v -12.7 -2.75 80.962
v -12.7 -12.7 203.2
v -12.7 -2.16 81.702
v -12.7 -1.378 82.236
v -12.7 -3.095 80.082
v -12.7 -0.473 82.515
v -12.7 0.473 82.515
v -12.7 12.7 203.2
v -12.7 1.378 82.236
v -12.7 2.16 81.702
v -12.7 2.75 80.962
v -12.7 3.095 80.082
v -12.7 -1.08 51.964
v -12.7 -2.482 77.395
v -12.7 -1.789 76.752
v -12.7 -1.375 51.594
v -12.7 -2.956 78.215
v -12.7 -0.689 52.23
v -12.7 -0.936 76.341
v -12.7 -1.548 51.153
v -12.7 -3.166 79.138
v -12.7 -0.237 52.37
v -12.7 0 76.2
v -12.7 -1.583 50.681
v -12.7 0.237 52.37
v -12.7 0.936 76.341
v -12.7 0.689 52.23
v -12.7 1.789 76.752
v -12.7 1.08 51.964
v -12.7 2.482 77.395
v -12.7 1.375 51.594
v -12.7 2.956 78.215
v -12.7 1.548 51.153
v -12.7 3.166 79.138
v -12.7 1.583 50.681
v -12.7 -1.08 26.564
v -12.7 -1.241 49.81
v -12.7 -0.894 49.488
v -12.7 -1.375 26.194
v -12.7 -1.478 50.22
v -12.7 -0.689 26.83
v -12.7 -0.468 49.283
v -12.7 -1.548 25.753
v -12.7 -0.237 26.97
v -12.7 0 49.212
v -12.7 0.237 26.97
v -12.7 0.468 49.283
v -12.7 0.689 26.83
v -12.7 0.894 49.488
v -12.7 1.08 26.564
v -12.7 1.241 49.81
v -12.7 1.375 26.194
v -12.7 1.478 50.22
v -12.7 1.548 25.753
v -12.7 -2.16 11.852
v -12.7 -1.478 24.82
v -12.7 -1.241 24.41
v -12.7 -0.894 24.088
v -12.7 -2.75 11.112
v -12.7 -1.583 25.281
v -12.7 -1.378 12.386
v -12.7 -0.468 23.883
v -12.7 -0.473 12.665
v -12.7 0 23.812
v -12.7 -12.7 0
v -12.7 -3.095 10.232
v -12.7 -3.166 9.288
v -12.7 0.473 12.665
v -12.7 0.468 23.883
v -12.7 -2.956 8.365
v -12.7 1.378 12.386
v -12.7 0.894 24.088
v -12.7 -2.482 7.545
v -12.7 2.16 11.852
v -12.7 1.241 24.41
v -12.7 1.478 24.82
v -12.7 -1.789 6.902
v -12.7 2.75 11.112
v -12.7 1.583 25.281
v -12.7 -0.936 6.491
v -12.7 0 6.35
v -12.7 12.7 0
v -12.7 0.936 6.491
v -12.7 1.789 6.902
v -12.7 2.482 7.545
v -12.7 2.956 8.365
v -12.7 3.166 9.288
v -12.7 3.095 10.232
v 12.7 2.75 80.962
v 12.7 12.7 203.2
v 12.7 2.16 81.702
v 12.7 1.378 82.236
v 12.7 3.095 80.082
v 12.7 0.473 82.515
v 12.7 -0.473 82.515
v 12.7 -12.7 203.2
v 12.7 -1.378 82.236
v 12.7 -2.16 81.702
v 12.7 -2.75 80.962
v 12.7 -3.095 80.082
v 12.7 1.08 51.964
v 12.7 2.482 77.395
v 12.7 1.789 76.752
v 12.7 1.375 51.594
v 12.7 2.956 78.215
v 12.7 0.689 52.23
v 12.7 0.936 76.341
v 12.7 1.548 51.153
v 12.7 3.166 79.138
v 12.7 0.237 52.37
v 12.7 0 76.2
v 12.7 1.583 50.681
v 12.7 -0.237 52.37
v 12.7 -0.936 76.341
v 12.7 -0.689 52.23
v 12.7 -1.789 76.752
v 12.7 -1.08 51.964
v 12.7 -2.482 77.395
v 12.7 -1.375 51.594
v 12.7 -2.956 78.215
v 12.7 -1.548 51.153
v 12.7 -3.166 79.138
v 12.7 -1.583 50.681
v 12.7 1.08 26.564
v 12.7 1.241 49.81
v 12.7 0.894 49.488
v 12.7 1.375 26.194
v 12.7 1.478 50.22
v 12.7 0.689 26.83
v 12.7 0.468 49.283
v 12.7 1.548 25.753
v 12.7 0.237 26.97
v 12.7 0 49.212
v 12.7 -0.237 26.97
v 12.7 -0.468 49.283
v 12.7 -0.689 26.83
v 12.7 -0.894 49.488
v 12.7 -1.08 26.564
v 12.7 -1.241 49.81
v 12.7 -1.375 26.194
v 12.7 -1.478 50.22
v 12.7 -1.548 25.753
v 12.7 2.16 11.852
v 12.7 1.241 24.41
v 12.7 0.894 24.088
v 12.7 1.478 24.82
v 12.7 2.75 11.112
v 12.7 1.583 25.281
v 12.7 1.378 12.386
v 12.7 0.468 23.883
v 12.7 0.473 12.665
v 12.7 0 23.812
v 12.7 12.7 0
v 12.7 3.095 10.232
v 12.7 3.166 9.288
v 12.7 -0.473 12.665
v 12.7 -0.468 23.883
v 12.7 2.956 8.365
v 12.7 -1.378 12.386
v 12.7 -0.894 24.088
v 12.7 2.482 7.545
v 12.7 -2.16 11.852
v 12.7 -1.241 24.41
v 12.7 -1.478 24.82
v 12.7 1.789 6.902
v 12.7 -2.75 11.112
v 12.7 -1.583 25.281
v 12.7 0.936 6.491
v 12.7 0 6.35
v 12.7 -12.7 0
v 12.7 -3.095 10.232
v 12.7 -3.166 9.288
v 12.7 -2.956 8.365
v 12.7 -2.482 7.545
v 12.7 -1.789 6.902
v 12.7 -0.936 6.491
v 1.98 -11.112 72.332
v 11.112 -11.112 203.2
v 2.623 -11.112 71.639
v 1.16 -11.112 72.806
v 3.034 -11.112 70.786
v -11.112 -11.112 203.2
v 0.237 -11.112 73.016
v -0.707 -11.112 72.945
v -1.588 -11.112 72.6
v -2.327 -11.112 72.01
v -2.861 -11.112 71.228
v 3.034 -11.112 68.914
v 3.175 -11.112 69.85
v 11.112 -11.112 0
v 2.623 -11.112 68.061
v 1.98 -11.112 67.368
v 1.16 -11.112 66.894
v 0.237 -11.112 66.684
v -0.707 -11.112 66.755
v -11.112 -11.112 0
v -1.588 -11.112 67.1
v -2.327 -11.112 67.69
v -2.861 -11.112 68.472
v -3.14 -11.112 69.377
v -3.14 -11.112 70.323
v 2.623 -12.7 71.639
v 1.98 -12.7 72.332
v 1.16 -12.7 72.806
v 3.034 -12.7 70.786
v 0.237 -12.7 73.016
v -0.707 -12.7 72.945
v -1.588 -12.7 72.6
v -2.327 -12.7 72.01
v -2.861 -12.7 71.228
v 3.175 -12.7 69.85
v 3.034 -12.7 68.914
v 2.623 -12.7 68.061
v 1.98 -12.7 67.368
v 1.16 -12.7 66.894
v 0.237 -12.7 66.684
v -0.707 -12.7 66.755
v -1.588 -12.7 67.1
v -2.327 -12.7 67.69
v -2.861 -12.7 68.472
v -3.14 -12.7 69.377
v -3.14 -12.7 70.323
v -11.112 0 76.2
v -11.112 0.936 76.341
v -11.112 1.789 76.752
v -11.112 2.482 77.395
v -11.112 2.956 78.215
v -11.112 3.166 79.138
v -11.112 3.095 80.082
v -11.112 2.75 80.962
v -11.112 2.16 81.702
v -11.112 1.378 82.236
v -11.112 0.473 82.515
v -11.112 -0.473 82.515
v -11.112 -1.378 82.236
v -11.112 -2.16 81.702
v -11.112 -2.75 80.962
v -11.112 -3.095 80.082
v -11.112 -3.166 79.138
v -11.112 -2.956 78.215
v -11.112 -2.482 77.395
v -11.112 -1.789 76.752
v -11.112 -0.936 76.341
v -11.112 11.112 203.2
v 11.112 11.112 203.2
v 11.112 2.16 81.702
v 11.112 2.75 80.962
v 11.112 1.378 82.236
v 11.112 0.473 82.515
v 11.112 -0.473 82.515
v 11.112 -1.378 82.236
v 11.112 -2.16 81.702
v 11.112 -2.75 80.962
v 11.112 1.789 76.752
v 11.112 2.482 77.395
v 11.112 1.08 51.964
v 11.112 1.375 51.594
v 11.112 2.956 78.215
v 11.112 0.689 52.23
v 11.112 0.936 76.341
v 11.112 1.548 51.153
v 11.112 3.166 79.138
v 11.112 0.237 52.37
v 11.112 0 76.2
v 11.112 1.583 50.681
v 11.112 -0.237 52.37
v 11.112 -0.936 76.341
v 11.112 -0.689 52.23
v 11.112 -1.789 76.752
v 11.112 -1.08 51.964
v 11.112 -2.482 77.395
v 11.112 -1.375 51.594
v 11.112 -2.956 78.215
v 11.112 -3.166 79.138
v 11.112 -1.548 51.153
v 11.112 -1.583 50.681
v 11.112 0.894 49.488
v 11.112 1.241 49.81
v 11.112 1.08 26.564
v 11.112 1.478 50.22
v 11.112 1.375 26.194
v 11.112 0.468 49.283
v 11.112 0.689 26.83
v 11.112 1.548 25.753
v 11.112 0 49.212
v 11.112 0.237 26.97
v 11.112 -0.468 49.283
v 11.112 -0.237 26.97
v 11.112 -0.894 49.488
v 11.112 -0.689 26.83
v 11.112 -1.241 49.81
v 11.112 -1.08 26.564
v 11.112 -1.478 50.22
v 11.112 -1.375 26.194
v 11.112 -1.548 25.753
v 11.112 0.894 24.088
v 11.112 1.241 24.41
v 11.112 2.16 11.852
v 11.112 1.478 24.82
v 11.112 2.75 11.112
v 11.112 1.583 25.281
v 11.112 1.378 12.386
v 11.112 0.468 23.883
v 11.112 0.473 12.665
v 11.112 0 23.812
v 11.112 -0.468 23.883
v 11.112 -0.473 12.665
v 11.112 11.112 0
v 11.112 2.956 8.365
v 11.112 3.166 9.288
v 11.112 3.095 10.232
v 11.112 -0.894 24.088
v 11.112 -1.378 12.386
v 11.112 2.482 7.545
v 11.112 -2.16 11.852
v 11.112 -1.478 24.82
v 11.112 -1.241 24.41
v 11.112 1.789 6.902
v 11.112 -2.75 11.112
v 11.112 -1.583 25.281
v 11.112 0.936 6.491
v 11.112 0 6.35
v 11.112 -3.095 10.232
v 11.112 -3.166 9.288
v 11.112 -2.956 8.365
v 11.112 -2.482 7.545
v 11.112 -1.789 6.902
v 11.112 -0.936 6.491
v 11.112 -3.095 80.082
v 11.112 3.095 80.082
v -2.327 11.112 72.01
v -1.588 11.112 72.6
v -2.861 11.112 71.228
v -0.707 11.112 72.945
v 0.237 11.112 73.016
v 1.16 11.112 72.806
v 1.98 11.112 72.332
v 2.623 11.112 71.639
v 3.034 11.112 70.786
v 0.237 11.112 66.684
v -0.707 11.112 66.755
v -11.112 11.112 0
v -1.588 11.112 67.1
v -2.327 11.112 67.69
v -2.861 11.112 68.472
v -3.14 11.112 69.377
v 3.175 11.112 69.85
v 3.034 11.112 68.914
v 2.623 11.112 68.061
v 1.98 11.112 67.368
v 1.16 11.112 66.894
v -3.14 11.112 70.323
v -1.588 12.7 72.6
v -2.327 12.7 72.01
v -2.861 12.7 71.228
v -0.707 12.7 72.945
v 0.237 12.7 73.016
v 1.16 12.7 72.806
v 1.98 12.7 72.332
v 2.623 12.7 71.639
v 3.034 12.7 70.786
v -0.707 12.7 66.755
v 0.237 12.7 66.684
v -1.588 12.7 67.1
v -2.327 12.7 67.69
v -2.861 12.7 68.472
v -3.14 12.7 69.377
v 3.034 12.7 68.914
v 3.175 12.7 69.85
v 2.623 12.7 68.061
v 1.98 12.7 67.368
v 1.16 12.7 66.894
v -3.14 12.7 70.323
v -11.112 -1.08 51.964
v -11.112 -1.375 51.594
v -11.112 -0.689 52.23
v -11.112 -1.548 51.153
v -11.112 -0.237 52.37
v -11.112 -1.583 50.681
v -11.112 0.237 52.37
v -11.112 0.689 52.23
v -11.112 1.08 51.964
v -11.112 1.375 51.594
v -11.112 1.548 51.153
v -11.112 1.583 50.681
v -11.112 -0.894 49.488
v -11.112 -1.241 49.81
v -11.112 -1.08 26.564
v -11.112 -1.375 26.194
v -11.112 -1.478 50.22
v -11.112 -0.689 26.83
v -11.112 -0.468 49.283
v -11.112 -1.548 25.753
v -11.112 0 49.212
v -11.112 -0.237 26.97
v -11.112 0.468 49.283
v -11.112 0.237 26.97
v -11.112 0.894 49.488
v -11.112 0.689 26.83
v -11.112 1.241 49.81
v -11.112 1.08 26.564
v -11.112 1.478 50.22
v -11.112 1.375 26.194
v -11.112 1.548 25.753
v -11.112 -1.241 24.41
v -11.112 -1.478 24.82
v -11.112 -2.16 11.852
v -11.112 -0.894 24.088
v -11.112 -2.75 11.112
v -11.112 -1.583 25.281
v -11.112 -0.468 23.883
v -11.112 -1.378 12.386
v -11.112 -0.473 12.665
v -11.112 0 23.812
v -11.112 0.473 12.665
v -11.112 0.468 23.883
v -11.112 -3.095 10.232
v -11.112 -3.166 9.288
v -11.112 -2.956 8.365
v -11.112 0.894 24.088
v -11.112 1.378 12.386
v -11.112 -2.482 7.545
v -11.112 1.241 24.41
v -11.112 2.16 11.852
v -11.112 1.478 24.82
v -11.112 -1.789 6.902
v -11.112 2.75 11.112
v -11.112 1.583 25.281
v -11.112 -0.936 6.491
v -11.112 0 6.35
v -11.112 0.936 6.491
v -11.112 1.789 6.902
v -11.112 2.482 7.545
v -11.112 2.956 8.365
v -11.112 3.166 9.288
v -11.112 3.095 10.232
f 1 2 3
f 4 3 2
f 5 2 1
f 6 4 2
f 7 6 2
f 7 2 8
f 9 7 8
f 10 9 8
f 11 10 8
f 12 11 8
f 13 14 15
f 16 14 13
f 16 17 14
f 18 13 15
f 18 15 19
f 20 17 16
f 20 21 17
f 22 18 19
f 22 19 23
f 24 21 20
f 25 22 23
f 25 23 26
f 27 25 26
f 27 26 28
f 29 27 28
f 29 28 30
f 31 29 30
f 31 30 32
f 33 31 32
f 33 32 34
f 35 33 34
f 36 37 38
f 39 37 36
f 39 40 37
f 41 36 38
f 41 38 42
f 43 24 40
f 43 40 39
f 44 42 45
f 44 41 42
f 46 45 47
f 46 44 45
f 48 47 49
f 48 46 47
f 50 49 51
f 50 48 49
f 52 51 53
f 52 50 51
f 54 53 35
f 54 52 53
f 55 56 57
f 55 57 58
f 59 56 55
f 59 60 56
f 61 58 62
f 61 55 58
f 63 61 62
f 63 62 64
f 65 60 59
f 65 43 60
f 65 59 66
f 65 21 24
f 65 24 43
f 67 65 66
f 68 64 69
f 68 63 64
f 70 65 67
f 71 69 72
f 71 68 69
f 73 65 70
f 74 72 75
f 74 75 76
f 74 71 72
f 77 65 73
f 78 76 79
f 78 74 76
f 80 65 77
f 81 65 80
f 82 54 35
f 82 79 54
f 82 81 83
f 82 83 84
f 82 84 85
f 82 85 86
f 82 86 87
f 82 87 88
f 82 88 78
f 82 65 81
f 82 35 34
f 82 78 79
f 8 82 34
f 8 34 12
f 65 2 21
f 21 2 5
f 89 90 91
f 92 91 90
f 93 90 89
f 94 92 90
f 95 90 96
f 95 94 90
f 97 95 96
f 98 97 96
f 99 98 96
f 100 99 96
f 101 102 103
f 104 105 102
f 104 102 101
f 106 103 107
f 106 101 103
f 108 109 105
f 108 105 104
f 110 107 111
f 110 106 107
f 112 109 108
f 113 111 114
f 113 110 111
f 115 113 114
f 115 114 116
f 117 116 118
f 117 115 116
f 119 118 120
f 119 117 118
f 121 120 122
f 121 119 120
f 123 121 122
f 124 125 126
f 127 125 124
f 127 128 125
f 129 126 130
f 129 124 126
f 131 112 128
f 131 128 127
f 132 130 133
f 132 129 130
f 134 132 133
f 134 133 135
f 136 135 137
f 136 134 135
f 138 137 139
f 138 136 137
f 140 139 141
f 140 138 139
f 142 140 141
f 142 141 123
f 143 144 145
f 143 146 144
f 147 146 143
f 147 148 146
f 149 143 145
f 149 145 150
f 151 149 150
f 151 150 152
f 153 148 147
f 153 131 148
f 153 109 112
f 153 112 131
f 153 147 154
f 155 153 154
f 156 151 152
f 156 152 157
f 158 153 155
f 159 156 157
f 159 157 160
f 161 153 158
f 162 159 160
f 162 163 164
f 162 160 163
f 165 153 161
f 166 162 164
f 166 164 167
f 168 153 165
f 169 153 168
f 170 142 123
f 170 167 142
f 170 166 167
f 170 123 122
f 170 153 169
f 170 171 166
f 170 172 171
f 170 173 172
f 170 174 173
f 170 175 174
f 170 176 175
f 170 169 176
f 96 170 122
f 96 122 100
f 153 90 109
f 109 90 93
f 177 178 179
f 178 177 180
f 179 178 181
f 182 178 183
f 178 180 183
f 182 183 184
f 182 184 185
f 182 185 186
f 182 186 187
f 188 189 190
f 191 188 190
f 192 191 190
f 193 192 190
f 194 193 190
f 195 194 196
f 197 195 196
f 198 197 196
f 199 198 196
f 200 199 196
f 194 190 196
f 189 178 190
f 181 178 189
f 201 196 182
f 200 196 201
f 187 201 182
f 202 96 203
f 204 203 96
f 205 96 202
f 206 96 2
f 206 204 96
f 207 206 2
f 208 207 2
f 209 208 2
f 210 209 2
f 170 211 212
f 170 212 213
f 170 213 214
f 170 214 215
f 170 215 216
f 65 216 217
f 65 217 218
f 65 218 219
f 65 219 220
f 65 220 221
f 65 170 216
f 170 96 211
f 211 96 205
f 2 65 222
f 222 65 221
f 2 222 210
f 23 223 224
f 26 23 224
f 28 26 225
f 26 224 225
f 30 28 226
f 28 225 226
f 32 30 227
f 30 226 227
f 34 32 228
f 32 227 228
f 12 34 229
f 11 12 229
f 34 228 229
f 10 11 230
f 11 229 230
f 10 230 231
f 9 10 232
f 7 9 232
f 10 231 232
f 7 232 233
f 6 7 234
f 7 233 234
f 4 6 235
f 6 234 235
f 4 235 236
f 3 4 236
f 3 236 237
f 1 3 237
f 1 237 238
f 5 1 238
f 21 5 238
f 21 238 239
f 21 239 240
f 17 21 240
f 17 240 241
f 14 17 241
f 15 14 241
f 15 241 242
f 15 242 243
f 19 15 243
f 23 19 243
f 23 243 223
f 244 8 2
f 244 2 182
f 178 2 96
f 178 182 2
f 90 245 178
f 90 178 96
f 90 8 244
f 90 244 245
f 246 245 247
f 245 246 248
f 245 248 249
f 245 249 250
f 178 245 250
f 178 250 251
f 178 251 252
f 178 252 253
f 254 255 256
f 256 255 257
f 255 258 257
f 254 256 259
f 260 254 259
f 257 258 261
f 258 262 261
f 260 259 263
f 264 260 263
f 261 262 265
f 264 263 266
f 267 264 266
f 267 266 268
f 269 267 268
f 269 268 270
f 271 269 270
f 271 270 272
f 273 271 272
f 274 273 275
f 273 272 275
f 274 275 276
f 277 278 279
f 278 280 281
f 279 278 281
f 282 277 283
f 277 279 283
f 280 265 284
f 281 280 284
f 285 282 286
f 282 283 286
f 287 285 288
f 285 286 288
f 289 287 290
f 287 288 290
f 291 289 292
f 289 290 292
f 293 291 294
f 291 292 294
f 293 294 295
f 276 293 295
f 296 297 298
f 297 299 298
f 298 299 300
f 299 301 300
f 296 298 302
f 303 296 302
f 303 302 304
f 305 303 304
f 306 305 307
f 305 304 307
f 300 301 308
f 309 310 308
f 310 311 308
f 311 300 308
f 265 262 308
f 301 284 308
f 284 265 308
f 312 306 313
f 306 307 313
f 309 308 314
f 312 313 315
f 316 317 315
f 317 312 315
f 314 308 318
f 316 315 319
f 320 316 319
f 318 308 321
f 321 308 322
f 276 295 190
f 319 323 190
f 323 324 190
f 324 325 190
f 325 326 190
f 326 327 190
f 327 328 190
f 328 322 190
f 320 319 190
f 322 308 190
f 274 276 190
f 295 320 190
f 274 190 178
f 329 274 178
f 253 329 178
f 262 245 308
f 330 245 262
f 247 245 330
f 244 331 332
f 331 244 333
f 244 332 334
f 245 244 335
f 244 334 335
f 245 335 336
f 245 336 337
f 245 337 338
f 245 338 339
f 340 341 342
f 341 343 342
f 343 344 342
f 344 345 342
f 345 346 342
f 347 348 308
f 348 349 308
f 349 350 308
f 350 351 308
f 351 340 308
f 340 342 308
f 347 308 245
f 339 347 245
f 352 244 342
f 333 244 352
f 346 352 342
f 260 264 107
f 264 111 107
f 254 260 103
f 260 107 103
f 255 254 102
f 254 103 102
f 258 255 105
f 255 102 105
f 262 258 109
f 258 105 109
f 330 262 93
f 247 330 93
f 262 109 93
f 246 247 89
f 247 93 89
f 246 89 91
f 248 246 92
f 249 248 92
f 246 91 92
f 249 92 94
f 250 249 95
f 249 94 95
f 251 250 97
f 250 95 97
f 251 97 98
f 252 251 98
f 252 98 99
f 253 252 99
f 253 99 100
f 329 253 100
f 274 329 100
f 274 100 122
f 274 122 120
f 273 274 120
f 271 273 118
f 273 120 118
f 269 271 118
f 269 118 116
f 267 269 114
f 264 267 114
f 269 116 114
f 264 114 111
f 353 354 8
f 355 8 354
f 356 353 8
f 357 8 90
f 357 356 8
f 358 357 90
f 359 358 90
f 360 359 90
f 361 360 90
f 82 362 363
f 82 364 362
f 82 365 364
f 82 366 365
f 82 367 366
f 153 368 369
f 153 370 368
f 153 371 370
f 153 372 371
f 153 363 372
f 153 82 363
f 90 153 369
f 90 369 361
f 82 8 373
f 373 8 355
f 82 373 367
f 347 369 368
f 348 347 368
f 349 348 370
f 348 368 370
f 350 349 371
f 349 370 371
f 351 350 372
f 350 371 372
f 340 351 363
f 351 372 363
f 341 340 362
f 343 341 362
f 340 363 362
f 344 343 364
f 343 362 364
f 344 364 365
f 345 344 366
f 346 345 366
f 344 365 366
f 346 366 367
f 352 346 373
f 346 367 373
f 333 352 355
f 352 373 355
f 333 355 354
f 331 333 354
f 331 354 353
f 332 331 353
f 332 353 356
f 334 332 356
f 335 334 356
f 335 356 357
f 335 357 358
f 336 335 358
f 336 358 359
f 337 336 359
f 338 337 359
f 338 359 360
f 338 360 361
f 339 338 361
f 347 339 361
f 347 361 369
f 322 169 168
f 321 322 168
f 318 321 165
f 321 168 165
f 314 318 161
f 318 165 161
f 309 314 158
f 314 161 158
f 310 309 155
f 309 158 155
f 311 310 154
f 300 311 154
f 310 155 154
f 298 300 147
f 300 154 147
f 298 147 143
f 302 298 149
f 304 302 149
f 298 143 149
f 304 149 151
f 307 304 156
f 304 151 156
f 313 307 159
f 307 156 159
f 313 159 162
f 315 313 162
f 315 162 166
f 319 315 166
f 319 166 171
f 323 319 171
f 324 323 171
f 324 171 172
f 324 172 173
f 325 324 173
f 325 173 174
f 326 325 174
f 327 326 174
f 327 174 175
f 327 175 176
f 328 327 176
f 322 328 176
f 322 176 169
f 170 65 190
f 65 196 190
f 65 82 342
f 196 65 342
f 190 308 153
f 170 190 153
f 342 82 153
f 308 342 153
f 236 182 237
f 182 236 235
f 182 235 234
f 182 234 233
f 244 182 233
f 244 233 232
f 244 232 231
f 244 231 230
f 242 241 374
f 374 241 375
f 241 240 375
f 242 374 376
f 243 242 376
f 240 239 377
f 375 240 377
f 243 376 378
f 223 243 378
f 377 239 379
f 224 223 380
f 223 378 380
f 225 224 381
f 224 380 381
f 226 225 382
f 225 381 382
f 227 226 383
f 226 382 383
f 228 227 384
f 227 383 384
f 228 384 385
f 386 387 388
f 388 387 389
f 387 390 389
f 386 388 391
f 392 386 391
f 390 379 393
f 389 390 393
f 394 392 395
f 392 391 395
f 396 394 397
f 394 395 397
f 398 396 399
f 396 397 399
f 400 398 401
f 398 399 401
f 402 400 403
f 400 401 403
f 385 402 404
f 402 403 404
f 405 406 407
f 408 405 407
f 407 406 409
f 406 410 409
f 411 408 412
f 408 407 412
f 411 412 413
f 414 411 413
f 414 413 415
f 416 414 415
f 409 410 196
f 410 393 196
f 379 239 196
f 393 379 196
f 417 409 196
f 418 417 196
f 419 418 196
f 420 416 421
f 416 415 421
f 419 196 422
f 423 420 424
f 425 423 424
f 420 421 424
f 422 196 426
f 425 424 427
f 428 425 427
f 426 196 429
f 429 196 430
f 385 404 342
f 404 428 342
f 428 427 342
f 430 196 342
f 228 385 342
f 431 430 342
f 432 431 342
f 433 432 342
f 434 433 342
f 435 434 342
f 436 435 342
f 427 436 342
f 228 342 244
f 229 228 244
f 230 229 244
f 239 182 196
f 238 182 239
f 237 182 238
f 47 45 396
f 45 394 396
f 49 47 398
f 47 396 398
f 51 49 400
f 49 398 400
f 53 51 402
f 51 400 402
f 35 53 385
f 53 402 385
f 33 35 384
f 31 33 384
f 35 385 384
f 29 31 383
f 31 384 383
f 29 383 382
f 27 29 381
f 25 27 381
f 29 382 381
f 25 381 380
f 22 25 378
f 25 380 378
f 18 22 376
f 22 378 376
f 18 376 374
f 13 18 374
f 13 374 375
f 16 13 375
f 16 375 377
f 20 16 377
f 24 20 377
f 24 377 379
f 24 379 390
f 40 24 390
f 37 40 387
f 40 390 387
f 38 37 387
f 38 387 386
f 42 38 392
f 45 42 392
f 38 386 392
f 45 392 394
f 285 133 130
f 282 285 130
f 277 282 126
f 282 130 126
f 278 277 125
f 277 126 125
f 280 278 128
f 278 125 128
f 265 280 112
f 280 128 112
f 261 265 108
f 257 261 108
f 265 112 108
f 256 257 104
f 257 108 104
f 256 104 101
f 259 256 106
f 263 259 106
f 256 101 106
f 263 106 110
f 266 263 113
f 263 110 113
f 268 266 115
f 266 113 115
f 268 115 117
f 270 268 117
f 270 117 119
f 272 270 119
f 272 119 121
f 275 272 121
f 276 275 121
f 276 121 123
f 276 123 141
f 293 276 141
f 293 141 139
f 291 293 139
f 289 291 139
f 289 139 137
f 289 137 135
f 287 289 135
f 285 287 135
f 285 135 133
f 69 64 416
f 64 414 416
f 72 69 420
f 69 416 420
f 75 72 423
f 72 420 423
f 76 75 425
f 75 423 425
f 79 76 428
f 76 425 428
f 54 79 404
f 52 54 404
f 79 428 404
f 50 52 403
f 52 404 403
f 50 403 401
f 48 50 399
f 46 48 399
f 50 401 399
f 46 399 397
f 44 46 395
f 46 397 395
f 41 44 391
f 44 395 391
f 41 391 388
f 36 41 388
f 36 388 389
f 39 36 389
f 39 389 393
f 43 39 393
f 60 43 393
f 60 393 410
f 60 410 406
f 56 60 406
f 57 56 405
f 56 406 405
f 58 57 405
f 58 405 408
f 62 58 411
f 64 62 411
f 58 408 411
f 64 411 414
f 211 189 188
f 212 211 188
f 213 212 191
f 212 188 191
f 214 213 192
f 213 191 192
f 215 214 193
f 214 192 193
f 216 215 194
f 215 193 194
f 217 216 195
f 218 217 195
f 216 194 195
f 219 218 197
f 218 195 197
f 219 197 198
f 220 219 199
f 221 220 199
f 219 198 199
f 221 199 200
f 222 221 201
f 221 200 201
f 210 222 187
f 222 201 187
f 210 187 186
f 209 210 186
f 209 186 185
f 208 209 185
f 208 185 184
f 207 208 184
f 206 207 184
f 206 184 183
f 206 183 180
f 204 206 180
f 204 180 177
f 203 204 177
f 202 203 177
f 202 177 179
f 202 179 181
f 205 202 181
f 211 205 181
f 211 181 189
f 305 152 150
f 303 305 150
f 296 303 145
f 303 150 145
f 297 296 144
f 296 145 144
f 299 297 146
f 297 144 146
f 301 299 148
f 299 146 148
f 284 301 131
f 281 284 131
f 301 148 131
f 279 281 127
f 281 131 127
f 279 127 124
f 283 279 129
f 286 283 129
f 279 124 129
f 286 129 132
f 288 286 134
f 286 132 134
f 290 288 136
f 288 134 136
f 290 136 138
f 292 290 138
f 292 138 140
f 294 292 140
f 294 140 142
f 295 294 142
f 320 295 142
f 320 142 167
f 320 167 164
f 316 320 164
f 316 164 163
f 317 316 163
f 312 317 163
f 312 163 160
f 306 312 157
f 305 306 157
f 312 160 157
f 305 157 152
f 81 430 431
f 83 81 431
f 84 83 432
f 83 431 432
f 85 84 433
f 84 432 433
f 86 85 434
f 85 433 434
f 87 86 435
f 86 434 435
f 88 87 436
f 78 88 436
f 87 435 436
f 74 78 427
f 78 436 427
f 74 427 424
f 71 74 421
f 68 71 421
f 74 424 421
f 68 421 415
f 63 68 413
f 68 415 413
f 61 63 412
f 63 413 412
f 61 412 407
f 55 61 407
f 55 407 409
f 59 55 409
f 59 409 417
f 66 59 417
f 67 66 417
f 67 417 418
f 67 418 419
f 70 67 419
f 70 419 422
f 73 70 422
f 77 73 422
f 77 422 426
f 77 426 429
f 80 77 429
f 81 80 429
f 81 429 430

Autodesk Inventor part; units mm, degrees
ref_plane "YZ Plane" through (0, 0, 0) normal (1, 0, 0) x (0, 1, 0)
ref_plane "XZ Plane" through (0, 0, 0) normal (0, 1, 0) x (-1, 0, 0)
ref_plane "XY Plane" through (0, 0, 0) normal (0, 0, 1) x (1, 0, 0)
sketch "Sketch1" plane through (0, 0, 0) normal (0, 0, 1) x (1, 0, 0)
  line L0 (0, 0) -> (-11.1125, 0) construction
  line L1 (0, 0) -> (0, 11.1125) construction
  line L2 (-11.1125, 11.1125) -> (11.1125, 11.1125)
  line L3 (11.1125, 11.1125) -> (11.1125, -11.1125)
  line L4 (11.1125, -11.1125) -> (-11.1125, -11.1125)
  line L5 (-11.1125, -11.1125) -> (-11.1125, 11.1125)
  line L6 (-12.7, 12.7) -> (12.7, 12.7)
  line L7 (12.7, 12.7) -> (12.7, -12.7)
  line L8 (12.7, -12.7) -> (-12.7, -12.7)
  line L9 (-12.7, -12.7) -> (-12.7, 12.7)
  line L10 (-11.1125, 0) -> (-12.7, 0) construction
  line L11 (0, 11.1125) -> (0, 12.7) construction
  dimension "d0" = 25.4
  dimension "d1" = 1.5875
extrude "Extrusion1" add sketch "Sketch1" along normal blind 203.2
sketch "Sketch2" plane through (-12.7, 12.7, 0) normal (0, 1, 0) x (1, 0, 0)
  line L0 (12.7, 0) -> (12.7, -203.2) construction
  line L1 (25.4, 0) -> (25.4, -203.2) construction
  circle A0 centre (12.7, -69.85) radius 3.175
  dimension "d4" = 6.35
  dimension "d5" = 69.85
extrude "Extrusion2" cut sketch "Sketch2" against normal through all
sketch "Sketch3" plane through (12.7, -12.7, 0) normal (1, 0, 0) x (0, 0, -1)
  line L0 (0, 12.7) -> (-203.2, 12.7) construction
  line L1 (0, 23.8125) -> (-203.2, 23.8125) construction
  circle A0 centre (-79.375, 12.7) radius 3.175
  circle A1 centre (-9.525, 12.7) radius 3.175
  line L2 (0, 25.4) -> (0, 0) projected
  line L3 (-38.1, 23.8125) -> (-38.1, 12.7) construction
  circle A2 centre (-50.8, 12.7) radius 1.5875
  circle A3 centre (-25.4, 12.7) radius 1.5875
  dimension "d8" = 6.35
  dimension "d9" = 79.375
  dimension "d12" = 6.35
  dimension "d13" = 9.525
  dimension "d22" = 3.175
  dimension "d23" = 25.4
  dimension "d24" = 38.1
extrude "Extrusion3" cut sketch "Sketch3" against normal through all
properties part number "Upright" material "Aluminum 6061"
